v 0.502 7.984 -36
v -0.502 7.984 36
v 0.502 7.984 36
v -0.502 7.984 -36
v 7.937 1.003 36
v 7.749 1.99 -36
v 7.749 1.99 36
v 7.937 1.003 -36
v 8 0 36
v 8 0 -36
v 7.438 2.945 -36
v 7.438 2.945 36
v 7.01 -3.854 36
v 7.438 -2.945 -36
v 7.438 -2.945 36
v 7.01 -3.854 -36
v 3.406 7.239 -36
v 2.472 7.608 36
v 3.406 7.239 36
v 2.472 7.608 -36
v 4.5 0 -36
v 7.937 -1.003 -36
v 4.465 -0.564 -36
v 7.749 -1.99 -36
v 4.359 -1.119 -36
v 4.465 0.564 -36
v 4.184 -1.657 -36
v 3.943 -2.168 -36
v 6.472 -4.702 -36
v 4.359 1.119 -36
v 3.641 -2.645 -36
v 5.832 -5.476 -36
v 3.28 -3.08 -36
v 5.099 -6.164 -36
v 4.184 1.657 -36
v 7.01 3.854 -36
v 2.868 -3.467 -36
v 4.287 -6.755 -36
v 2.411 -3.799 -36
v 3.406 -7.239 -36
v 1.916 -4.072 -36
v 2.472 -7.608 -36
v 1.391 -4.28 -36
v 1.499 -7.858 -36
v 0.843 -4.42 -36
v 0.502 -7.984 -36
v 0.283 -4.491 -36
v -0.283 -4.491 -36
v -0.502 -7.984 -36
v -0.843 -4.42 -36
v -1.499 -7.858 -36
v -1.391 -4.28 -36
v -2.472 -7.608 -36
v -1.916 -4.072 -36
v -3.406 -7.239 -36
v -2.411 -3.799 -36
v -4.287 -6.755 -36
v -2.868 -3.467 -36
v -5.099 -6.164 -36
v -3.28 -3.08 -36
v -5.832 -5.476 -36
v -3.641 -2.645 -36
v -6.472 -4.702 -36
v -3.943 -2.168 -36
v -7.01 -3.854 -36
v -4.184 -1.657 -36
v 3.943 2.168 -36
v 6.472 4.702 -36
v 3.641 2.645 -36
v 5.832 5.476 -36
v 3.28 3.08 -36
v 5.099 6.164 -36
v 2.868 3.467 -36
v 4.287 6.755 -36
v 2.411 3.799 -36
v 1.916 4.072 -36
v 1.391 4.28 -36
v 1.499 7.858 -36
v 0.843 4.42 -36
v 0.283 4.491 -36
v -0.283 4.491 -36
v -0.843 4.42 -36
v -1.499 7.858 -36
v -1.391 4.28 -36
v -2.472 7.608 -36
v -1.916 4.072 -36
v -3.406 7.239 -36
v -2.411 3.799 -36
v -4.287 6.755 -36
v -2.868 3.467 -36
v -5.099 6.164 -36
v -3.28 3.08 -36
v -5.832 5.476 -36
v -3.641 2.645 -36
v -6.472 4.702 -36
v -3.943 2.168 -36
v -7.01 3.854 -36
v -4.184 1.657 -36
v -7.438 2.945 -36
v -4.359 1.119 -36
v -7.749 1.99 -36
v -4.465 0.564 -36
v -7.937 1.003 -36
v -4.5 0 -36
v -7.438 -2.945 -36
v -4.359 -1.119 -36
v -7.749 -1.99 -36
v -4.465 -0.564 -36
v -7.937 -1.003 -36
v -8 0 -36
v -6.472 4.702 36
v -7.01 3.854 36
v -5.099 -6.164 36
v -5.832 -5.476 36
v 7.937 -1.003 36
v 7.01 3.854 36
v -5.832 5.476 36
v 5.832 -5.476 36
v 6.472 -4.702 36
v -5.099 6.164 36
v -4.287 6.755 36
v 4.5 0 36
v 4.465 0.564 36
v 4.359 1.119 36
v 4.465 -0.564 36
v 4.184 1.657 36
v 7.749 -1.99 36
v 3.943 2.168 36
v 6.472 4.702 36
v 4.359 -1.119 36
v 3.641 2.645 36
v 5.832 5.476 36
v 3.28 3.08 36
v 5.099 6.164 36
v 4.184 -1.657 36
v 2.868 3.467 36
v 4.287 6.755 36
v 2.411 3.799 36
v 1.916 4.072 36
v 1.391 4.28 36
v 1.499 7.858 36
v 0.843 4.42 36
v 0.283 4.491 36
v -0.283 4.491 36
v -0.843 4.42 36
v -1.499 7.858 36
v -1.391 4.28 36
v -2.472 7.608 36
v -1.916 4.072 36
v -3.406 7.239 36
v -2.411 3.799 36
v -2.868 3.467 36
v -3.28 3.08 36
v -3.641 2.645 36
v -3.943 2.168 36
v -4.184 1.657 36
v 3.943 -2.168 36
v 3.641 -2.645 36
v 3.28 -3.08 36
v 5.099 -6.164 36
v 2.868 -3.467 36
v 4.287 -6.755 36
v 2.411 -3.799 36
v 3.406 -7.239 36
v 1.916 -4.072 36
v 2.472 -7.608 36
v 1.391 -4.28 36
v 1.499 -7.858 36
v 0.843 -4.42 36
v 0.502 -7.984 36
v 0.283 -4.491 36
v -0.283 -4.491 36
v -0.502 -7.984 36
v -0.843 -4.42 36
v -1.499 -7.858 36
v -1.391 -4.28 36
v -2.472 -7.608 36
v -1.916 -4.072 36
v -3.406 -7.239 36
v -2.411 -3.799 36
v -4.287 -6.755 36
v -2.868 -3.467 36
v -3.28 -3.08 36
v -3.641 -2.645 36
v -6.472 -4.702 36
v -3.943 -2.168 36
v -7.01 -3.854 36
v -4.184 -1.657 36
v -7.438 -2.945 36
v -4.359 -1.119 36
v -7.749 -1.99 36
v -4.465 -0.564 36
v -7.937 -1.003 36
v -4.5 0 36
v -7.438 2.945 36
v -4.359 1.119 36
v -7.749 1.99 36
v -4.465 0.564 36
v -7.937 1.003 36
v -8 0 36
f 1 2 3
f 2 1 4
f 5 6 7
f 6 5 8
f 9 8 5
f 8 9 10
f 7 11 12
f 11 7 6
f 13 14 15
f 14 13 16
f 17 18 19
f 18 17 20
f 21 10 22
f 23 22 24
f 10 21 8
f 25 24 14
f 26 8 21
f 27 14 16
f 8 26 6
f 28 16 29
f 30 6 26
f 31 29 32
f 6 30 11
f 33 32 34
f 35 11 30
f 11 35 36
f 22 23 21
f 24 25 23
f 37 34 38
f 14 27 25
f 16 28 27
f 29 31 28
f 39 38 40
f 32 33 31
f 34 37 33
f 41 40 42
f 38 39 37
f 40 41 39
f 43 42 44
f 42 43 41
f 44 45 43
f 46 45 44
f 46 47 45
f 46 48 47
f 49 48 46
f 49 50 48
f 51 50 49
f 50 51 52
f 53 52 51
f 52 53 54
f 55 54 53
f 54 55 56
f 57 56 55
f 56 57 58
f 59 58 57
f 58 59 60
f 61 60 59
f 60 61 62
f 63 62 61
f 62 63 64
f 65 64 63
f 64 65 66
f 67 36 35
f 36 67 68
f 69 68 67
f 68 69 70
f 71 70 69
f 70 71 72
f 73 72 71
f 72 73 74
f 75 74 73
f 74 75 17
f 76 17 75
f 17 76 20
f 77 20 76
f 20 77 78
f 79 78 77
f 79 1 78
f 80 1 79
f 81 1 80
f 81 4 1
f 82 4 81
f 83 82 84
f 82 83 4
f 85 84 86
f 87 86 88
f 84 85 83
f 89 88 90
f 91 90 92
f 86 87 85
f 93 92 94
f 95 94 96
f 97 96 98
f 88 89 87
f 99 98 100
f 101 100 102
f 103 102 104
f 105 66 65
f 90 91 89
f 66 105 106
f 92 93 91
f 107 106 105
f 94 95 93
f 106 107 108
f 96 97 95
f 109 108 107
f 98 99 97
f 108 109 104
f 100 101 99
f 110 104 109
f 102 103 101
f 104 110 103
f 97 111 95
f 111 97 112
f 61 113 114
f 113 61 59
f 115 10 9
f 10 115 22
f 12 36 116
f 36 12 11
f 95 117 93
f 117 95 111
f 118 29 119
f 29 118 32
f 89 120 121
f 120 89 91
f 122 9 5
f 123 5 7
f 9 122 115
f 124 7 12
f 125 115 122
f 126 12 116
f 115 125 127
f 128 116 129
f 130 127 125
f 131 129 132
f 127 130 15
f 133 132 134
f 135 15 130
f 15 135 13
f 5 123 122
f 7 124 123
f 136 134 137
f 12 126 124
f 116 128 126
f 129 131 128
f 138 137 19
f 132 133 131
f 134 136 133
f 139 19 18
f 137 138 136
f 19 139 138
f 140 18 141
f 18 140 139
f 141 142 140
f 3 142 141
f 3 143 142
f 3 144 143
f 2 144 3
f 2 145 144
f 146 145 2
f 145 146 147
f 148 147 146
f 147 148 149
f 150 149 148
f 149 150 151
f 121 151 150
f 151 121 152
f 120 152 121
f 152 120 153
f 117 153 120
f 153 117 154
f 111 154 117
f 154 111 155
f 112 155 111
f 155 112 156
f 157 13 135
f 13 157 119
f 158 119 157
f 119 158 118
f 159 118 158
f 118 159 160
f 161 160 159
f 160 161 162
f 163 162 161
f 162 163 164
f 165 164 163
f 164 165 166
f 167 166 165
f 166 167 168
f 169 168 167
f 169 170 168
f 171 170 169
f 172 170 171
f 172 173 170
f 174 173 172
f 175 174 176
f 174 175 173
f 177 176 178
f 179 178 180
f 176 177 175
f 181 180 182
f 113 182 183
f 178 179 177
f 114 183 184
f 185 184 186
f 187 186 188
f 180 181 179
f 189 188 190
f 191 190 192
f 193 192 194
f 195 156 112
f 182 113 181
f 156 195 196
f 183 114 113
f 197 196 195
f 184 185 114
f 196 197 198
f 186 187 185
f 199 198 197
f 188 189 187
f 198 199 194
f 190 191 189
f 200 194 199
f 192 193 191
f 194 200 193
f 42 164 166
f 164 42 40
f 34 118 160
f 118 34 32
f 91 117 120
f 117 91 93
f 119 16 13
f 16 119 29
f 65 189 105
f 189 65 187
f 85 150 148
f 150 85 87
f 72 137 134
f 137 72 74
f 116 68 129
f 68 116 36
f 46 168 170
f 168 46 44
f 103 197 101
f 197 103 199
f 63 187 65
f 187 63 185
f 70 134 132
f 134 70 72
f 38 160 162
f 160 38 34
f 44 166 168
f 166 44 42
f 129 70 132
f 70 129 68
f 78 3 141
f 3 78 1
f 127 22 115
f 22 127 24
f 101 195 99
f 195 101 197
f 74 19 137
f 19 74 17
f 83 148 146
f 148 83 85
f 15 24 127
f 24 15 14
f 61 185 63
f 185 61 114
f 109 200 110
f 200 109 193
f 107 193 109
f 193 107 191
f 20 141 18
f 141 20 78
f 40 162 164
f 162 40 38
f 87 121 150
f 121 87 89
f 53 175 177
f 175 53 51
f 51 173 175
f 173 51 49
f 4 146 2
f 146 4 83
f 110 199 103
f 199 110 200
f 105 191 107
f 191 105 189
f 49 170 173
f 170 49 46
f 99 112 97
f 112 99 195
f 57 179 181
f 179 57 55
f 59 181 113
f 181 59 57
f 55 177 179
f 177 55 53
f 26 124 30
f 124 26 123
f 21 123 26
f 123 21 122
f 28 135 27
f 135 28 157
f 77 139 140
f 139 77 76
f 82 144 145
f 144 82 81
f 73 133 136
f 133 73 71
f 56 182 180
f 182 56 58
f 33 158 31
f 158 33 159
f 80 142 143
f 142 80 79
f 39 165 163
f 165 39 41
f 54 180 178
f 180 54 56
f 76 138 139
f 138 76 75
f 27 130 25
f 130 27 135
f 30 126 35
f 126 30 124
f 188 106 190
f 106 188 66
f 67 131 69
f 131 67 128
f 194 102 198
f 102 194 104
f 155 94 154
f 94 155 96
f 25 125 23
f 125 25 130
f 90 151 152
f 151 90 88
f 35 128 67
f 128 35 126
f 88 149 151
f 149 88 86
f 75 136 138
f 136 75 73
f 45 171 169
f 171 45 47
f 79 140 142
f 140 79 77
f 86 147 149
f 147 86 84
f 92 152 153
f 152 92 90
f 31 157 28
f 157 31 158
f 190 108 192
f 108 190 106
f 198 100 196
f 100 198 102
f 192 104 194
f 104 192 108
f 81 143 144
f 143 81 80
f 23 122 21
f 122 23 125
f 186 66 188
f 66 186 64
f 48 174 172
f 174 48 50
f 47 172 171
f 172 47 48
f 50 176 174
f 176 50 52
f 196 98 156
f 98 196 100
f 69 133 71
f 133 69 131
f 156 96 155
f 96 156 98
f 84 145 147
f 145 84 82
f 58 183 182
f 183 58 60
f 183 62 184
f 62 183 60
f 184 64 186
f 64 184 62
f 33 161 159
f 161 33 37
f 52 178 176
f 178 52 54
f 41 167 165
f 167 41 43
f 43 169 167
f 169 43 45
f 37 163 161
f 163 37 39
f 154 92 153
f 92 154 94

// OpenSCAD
$fn = 50;


difference() {
	union() {
		translate(v = [0, 0, -36.0000000000]) {
			cylinder(h = 72, r = 8.0000000000);
		}
	}
	union() {
		translate(v = [0, 0, -100.0000000000]) {
			cylinder(h = 200, r = 4.5000000000);
		}
	}
}
